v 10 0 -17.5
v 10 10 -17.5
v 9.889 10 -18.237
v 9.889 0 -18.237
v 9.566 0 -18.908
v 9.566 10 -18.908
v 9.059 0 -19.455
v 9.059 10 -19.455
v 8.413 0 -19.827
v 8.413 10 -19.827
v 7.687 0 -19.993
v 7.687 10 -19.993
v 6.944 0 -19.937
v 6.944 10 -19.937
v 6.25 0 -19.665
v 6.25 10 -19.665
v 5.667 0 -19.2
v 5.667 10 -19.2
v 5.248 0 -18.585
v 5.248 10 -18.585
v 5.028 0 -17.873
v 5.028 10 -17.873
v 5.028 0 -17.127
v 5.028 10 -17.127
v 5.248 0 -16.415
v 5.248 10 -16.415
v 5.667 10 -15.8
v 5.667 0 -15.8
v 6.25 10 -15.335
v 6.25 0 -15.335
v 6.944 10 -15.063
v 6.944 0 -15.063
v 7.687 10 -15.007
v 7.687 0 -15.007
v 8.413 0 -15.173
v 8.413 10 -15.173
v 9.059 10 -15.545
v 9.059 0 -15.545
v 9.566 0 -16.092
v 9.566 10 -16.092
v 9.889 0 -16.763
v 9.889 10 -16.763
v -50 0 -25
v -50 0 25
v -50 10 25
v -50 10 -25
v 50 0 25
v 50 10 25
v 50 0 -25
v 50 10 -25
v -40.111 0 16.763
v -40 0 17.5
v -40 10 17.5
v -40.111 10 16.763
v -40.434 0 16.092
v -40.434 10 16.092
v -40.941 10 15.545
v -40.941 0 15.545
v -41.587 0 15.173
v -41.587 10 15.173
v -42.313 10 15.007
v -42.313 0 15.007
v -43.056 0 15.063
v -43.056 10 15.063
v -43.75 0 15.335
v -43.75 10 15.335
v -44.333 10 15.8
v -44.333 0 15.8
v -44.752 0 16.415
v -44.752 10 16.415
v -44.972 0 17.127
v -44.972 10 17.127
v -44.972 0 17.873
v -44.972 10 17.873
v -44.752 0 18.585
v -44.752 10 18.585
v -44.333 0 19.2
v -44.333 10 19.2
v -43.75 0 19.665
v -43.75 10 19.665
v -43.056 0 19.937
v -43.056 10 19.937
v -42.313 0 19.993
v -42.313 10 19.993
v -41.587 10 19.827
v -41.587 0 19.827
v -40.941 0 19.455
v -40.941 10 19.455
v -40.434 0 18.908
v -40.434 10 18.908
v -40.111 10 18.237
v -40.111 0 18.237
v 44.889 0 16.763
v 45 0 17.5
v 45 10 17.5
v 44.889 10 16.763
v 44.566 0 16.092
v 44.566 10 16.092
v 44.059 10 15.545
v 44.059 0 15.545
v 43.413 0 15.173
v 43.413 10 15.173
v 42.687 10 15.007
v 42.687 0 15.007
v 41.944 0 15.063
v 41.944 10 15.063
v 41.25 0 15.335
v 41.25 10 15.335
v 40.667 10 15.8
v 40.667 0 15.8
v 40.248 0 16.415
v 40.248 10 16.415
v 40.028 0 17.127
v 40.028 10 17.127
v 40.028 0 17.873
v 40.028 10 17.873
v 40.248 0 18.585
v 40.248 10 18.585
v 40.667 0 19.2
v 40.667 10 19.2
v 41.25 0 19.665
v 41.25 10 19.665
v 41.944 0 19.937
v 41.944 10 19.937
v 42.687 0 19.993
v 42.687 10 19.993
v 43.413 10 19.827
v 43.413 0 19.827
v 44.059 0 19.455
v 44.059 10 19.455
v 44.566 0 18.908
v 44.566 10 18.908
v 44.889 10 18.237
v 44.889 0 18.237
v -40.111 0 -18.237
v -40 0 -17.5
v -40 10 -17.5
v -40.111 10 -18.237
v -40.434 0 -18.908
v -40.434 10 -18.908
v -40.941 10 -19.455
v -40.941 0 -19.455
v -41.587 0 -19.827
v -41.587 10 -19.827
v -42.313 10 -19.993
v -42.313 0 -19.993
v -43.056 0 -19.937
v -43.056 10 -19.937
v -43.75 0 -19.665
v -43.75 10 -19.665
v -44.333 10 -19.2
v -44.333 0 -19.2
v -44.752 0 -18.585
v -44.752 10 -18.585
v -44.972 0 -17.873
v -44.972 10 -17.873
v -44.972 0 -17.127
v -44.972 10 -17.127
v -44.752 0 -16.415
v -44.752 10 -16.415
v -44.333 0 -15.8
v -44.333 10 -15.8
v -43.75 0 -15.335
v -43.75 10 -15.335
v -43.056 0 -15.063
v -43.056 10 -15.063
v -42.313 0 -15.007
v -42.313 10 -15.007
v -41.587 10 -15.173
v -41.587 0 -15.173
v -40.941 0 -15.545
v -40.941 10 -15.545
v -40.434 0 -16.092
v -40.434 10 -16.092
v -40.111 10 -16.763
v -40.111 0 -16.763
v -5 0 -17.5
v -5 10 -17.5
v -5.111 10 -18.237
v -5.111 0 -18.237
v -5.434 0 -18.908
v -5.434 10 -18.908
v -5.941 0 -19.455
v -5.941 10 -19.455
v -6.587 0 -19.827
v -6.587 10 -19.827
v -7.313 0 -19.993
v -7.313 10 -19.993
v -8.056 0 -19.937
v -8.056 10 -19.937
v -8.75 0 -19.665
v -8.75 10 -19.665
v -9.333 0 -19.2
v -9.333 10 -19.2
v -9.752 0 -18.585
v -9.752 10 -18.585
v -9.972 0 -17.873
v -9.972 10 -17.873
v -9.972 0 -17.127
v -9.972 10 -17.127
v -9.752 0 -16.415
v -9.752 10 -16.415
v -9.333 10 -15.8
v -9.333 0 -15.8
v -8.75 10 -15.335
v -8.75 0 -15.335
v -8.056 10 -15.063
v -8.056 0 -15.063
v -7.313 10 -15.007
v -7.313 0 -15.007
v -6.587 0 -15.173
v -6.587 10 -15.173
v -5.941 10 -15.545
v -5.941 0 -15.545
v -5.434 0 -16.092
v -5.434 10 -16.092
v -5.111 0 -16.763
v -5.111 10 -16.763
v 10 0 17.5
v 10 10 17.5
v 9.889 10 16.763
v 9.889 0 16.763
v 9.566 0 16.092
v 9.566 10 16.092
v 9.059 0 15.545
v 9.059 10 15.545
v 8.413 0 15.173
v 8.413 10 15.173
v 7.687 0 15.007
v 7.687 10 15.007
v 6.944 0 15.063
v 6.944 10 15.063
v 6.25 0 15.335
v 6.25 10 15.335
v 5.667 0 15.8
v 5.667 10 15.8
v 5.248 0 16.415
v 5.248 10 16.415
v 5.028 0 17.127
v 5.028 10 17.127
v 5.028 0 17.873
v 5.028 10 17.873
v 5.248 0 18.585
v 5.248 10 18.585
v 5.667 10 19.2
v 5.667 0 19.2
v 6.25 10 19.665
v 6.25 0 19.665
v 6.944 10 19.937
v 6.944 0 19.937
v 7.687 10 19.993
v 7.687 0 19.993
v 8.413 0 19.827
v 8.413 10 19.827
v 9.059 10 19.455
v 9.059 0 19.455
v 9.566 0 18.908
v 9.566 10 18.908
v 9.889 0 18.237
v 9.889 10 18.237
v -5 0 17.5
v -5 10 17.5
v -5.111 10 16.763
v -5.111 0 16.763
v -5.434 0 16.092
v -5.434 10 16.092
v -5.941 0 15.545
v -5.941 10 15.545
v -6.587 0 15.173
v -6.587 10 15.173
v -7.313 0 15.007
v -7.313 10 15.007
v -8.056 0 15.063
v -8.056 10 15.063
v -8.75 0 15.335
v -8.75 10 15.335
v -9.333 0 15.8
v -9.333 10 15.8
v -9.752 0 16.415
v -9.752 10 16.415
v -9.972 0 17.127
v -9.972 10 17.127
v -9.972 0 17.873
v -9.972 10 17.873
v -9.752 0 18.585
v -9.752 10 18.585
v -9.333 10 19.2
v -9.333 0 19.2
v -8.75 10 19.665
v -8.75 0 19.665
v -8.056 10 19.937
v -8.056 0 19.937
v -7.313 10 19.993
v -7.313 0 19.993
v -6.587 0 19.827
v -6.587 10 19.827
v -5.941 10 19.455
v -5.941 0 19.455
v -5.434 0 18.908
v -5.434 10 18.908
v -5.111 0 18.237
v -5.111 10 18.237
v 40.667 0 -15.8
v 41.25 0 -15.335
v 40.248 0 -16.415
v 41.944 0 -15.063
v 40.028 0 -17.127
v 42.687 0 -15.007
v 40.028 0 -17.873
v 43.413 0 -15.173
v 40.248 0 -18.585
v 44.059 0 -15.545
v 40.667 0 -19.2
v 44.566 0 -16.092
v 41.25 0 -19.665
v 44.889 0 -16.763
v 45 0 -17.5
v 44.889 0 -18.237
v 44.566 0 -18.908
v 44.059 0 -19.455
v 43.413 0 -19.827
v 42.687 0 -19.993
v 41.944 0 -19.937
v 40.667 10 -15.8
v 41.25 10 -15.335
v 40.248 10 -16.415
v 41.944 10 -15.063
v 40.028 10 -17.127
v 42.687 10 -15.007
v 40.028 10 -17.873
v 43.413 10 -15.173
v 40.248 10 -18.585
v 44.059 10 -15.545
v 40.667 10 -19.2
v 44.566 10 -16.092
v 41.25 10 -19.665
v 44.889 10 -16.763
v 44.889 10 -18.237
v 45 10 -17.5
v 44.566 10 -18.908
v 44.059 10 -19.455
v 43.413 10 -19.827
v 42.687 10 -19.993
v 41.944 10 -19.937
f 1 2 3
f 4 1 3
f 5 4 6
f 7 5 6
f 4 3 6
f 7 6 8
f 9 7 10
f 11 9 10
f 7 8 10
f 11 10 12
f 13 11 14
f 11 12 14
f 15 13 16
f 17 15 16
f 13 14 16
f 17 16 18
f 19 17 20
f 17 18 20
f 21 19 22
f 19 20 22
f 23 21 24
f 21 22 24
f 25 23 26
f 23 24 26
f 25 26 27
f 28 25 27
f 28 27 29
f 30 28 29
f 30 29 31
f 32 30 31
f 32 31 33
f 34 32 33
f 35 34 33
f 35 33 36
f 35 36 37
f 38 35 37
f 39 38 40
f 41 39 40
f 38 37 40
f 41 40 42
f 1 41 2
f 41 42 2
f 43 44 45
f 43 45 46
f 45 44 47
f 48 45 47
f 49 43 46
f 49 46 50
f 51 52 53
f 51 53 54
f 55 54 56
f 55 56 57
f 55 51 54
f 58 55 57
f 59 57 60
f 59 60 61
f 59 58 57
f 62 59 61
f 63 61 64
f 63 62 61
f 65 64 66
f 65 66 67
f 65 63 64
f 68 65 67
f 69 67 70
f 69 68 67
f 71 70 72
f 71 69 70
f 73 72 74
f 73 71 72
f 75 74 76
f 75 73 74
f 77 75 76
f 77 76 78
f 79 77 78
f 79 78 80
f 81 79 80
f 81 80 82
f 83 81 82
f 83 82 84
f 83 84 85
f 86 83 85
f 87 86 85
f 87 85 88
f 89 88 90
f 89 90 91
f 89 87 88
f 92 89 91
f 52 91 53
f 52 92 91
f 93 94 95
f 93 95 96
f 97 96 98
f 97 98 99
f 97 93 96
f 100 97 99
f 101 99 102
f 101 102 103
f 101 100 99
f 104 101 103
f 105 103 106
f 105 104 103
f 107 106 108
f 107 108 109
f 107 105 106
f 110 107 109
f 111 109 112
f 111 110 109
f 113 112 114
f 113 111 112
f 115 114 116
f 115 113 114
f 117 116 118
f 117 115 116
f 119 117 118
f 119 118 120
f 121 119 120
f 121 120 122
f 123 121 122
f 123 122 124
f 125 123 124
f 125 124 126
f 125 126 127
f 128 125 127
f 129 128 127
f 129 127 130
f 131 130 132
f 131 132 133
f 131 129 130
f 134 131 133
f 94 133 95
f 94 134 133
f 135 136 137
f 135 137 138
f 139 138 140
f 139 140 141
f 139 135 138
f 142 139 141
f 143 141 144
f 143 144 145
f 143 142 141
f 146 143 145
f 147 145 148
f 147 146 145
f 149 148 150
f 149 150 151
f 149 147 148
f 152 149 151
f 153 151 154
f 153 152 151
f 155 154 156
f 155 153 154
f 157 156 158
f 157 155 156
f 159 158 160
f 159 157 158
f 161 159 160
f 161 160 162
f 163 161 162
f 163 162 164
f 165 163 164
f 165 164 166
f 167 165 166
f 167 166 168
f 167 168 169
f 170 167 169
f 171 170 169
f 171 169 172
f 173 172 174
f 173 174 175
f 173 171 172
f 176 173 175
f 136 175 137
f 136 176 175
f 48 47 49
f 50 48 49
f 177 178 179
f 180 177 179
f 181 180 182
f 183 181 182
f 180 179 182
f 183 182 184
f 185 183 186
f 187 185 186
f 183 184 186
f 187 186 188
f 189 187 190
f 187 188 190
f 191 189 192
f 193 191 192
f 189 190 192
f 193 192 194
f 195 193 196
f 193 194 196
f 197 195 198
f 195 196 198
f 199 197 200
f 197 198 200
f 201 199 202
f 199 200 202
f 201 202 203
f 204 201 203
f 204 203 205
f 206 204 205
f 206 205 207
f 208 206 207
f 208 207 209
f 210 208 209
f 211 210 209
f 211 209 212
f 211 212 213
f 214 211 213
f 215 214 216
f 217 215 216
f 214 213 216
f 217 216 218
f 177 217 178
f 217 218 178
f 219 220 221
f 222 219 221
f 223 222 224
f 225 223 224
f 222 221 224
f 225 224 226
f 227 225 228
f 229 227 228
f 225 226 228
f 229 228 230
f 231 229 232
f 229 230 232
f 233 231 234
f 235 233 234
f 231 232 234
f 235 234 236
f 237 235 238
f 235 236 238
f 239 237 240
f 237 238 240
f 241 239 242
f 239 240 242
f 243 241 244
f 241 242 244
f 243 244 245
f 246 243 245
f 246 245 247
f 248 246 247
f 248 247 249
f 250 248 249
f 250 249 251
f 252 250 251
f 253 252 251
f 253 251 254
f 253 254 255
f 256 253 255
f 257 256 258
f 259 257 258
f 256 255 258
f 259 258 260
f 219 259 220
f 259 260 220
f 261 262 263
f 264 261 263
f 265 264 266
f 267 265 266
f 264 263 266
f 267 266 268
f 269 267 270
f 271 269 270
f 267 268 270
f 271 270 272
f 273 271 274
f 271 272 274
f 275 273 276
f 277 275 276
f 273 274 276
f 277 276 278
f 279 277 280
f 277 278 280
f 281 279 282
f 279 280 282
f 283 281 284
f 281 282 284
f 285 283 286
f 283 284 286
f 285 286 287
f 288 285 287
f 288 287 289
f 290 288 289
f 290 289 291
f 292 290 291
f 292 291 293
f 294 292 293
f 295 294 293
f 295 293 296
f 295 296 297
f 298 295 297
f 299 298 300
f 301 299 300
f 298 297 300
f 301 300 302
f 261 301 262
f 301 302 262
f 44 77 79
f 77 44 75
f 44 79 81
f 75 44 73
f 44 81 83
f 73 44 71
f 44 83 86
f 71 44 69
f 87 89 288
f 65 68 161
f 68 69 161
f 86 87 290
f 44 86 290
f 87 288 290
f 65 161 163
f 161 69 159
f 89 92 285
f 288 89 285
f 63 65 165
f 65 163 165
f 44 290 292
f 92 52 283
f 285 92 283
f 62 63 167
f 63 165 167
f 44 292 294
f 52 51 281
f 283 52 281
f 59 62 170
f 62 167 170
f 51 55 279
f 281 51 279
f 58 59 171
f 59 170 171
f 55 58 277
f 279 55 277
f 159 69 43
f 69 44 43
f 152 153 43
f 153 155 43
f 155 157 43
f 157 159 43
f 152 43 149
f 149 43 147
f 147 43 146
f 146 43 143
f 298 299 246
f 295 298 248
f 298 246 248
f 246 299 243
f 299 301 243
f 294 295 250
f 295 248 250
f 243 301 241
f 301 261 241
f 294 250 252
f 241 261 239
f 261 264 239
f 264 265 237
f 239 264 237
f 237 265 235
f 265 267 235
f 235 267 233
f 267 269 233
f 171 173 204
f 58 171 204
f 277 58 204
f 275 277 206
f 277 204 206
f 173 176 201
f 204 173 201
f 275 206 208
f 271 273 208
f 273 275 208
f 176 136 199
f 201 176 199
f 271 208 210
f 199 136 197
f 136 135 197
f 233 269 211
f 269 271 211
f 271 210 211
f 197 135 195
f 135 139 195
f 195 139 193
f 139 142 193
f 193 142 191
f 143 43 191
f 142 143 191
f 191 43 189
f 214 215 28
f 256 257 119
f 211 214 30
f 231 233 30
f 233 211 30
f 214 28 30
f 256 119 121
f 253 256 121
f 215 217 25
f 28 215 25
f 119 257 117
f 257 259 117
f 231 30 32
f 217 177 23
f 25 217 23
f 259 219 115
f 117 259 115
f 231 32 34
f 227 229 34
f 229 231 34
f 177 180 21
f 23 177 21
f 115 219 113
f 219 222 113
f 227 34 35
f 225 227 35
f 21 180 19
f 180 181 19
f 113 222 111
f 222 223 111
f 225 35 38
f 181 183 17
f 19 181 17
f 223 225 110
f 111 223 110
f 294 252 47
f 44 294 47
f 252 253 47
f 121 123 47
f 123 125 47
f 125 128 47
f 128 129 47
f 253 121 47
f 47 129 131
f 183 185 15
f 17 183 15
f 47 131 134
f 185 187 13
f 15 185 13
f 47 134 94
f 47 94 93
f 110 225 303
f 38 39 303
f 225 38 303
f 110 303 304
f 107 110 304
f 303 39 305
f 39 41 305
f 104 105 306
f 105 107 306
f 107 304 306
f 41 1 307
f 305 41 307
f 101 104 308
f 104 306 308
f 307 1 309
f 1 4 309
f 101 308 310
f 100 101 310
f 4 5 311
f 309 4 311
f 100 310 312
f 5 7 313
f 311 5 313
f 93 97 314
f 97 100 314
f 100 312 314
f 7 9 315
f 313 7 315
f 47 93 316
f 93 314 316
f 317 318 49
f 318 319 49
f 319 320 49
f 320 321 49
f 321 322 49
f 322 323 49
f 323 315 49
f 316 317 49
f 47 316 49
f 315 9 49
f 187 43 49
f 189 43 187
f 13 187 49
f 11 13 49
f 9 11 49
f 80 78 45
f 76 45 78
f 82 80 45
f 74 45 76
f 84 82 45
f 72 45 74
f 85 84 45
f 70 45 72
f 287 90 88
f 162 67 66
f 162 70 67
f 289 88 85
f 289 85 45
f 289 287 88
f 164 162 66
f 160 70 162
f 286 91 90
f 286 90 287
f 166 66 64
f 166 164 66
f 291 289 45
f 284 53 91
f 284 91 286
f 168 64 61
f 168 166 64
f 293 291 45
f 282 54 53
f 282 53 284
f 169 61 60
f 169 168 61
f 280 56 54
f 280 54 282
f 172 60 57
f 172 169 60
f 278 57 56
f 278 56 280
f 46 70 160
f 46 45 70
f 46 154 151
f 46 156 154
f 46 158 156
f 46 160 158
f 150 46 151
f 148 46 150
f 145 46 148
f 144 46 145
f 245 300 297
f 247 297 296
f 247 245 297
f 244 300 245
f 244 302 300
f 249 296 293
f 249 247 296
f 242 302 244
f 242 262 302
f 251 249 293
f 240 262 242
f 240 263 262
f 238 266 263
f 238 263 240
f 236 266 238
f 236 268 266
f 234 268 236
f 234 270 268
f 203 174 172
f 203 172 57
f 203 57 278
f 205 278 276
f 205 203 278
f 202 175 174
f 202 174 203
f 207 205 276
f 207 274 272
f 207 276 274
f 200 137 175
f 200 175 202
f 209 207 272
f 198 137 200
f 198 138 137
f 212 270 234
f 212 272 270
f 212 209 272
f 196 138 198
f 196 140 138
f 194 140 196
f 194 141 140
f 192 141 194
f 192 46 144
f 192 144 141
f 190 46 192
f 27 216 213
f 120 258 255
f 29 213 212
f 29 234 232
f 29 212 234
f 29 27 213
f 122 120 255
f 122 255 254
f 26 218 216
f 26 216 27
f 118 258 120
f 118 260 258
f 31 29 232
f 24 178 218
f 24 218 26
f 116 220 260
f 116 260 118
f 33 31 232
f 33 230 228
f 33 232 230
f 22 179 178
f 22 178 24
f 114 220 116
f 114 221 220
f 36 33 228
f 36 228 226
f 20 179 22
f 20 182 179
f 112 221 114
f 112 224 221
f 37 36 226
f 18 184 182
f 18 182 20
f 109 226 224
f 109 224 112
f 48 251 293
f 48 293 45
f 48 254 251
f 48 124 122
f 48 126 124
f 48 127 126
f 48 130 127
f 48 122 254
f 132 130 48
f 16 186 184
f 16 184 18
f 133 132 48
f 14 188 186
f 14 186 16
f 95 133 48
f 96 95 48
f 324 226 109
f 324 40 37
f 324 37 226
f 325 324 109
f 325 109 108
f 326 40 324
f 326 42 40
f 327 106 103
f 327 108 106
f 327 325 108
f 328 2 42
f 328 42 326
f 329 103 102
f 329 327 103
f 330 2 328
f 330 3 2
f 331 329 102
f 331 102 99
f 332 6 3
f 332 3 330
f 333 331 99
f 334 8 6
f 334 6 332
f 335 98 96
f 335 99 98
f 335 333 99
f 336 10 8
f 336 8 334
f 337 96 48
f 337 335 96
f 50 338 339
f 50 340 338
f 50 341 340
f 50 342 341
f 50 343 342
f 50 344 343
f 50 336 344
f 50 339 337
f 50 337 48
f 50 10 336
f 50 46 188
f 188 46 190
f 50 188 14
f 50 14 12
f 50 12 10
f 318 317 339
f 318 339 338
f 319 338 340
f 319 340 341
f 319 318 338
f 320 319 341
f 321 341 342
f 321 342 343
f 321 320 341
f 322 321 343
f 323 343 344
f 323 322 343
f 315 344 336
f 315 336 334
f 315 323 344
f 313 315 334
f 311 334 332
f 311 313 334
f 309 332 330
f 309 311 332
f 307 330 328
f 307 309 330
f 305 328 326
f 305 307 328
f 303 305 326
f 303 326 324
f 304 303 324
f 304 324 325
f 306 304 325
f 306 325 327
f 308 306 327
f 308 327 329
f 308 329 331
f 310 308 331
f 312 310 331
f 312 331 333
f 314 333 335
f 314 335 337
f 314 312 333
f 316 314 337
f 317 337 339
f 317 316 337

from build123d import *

# Parameters (mm, degrees)
SKETCH1_W           = 100
SKETCH1_H           = 50
SKETCH1_R           = 2.5
BOSS_EXTRUDE1_DEPTH = 10
SKETCH3_R           = 2.5
CUT_EXTRUDE1_DEPTH  = 10


with BuildPart() as part:
    # Sketch1 → Boss-Extrude1 (new body)
    with BuildSketch(Plane(origin=(0, 0, 0), x_dir=(1, 0, 0), z_dir=(0, 1, 0))):
        Rectangle(SKETCH1_W, SKETCH1_H)
        with Locations((-42.5, 17.5)):
            Circle(SKETCH1_R, mode=Mode.SUBTRACT)
        with Locations((42.5, 17.5)):
            Circle(SKETCH1_R, mode=Mode.SUBTRACT)
        with Locations((42.5, -17.5)):
            Circle(SKETCH1_R, mode=Mode.SUBTRACT)
        with Locations((-42.5, -17.5)):
            Circle(SKETCH1_R, mode=Mode.SUBTRACT)
    extrude(amount=BOSS_EXTRUDE1_DEPTH)

    # Sketch3 → Cut-Extrude1 (cut)
    with BuildSketch(Plane(origin=(0, 10, 0), x_dir=(1, 0, 0), z_dir=(0, 1, 0))):
        with Locations((-7.5, 17.5)):
            Circle(SKETCH3_R)
        with Locations((7.5, 17.5)):
            Circle(SKETCH3_R)
        with Locations((7.5, -17.5)):
            Circle(SKETCH3_R)
        with Locations((-7.5, -17.5)):
            Circle(SKETCH3_R)
    extrude(amount=-CUT_EXTRUDE1_DEPTH, mode=Mode.SUBTRACT)


solid = part.part
